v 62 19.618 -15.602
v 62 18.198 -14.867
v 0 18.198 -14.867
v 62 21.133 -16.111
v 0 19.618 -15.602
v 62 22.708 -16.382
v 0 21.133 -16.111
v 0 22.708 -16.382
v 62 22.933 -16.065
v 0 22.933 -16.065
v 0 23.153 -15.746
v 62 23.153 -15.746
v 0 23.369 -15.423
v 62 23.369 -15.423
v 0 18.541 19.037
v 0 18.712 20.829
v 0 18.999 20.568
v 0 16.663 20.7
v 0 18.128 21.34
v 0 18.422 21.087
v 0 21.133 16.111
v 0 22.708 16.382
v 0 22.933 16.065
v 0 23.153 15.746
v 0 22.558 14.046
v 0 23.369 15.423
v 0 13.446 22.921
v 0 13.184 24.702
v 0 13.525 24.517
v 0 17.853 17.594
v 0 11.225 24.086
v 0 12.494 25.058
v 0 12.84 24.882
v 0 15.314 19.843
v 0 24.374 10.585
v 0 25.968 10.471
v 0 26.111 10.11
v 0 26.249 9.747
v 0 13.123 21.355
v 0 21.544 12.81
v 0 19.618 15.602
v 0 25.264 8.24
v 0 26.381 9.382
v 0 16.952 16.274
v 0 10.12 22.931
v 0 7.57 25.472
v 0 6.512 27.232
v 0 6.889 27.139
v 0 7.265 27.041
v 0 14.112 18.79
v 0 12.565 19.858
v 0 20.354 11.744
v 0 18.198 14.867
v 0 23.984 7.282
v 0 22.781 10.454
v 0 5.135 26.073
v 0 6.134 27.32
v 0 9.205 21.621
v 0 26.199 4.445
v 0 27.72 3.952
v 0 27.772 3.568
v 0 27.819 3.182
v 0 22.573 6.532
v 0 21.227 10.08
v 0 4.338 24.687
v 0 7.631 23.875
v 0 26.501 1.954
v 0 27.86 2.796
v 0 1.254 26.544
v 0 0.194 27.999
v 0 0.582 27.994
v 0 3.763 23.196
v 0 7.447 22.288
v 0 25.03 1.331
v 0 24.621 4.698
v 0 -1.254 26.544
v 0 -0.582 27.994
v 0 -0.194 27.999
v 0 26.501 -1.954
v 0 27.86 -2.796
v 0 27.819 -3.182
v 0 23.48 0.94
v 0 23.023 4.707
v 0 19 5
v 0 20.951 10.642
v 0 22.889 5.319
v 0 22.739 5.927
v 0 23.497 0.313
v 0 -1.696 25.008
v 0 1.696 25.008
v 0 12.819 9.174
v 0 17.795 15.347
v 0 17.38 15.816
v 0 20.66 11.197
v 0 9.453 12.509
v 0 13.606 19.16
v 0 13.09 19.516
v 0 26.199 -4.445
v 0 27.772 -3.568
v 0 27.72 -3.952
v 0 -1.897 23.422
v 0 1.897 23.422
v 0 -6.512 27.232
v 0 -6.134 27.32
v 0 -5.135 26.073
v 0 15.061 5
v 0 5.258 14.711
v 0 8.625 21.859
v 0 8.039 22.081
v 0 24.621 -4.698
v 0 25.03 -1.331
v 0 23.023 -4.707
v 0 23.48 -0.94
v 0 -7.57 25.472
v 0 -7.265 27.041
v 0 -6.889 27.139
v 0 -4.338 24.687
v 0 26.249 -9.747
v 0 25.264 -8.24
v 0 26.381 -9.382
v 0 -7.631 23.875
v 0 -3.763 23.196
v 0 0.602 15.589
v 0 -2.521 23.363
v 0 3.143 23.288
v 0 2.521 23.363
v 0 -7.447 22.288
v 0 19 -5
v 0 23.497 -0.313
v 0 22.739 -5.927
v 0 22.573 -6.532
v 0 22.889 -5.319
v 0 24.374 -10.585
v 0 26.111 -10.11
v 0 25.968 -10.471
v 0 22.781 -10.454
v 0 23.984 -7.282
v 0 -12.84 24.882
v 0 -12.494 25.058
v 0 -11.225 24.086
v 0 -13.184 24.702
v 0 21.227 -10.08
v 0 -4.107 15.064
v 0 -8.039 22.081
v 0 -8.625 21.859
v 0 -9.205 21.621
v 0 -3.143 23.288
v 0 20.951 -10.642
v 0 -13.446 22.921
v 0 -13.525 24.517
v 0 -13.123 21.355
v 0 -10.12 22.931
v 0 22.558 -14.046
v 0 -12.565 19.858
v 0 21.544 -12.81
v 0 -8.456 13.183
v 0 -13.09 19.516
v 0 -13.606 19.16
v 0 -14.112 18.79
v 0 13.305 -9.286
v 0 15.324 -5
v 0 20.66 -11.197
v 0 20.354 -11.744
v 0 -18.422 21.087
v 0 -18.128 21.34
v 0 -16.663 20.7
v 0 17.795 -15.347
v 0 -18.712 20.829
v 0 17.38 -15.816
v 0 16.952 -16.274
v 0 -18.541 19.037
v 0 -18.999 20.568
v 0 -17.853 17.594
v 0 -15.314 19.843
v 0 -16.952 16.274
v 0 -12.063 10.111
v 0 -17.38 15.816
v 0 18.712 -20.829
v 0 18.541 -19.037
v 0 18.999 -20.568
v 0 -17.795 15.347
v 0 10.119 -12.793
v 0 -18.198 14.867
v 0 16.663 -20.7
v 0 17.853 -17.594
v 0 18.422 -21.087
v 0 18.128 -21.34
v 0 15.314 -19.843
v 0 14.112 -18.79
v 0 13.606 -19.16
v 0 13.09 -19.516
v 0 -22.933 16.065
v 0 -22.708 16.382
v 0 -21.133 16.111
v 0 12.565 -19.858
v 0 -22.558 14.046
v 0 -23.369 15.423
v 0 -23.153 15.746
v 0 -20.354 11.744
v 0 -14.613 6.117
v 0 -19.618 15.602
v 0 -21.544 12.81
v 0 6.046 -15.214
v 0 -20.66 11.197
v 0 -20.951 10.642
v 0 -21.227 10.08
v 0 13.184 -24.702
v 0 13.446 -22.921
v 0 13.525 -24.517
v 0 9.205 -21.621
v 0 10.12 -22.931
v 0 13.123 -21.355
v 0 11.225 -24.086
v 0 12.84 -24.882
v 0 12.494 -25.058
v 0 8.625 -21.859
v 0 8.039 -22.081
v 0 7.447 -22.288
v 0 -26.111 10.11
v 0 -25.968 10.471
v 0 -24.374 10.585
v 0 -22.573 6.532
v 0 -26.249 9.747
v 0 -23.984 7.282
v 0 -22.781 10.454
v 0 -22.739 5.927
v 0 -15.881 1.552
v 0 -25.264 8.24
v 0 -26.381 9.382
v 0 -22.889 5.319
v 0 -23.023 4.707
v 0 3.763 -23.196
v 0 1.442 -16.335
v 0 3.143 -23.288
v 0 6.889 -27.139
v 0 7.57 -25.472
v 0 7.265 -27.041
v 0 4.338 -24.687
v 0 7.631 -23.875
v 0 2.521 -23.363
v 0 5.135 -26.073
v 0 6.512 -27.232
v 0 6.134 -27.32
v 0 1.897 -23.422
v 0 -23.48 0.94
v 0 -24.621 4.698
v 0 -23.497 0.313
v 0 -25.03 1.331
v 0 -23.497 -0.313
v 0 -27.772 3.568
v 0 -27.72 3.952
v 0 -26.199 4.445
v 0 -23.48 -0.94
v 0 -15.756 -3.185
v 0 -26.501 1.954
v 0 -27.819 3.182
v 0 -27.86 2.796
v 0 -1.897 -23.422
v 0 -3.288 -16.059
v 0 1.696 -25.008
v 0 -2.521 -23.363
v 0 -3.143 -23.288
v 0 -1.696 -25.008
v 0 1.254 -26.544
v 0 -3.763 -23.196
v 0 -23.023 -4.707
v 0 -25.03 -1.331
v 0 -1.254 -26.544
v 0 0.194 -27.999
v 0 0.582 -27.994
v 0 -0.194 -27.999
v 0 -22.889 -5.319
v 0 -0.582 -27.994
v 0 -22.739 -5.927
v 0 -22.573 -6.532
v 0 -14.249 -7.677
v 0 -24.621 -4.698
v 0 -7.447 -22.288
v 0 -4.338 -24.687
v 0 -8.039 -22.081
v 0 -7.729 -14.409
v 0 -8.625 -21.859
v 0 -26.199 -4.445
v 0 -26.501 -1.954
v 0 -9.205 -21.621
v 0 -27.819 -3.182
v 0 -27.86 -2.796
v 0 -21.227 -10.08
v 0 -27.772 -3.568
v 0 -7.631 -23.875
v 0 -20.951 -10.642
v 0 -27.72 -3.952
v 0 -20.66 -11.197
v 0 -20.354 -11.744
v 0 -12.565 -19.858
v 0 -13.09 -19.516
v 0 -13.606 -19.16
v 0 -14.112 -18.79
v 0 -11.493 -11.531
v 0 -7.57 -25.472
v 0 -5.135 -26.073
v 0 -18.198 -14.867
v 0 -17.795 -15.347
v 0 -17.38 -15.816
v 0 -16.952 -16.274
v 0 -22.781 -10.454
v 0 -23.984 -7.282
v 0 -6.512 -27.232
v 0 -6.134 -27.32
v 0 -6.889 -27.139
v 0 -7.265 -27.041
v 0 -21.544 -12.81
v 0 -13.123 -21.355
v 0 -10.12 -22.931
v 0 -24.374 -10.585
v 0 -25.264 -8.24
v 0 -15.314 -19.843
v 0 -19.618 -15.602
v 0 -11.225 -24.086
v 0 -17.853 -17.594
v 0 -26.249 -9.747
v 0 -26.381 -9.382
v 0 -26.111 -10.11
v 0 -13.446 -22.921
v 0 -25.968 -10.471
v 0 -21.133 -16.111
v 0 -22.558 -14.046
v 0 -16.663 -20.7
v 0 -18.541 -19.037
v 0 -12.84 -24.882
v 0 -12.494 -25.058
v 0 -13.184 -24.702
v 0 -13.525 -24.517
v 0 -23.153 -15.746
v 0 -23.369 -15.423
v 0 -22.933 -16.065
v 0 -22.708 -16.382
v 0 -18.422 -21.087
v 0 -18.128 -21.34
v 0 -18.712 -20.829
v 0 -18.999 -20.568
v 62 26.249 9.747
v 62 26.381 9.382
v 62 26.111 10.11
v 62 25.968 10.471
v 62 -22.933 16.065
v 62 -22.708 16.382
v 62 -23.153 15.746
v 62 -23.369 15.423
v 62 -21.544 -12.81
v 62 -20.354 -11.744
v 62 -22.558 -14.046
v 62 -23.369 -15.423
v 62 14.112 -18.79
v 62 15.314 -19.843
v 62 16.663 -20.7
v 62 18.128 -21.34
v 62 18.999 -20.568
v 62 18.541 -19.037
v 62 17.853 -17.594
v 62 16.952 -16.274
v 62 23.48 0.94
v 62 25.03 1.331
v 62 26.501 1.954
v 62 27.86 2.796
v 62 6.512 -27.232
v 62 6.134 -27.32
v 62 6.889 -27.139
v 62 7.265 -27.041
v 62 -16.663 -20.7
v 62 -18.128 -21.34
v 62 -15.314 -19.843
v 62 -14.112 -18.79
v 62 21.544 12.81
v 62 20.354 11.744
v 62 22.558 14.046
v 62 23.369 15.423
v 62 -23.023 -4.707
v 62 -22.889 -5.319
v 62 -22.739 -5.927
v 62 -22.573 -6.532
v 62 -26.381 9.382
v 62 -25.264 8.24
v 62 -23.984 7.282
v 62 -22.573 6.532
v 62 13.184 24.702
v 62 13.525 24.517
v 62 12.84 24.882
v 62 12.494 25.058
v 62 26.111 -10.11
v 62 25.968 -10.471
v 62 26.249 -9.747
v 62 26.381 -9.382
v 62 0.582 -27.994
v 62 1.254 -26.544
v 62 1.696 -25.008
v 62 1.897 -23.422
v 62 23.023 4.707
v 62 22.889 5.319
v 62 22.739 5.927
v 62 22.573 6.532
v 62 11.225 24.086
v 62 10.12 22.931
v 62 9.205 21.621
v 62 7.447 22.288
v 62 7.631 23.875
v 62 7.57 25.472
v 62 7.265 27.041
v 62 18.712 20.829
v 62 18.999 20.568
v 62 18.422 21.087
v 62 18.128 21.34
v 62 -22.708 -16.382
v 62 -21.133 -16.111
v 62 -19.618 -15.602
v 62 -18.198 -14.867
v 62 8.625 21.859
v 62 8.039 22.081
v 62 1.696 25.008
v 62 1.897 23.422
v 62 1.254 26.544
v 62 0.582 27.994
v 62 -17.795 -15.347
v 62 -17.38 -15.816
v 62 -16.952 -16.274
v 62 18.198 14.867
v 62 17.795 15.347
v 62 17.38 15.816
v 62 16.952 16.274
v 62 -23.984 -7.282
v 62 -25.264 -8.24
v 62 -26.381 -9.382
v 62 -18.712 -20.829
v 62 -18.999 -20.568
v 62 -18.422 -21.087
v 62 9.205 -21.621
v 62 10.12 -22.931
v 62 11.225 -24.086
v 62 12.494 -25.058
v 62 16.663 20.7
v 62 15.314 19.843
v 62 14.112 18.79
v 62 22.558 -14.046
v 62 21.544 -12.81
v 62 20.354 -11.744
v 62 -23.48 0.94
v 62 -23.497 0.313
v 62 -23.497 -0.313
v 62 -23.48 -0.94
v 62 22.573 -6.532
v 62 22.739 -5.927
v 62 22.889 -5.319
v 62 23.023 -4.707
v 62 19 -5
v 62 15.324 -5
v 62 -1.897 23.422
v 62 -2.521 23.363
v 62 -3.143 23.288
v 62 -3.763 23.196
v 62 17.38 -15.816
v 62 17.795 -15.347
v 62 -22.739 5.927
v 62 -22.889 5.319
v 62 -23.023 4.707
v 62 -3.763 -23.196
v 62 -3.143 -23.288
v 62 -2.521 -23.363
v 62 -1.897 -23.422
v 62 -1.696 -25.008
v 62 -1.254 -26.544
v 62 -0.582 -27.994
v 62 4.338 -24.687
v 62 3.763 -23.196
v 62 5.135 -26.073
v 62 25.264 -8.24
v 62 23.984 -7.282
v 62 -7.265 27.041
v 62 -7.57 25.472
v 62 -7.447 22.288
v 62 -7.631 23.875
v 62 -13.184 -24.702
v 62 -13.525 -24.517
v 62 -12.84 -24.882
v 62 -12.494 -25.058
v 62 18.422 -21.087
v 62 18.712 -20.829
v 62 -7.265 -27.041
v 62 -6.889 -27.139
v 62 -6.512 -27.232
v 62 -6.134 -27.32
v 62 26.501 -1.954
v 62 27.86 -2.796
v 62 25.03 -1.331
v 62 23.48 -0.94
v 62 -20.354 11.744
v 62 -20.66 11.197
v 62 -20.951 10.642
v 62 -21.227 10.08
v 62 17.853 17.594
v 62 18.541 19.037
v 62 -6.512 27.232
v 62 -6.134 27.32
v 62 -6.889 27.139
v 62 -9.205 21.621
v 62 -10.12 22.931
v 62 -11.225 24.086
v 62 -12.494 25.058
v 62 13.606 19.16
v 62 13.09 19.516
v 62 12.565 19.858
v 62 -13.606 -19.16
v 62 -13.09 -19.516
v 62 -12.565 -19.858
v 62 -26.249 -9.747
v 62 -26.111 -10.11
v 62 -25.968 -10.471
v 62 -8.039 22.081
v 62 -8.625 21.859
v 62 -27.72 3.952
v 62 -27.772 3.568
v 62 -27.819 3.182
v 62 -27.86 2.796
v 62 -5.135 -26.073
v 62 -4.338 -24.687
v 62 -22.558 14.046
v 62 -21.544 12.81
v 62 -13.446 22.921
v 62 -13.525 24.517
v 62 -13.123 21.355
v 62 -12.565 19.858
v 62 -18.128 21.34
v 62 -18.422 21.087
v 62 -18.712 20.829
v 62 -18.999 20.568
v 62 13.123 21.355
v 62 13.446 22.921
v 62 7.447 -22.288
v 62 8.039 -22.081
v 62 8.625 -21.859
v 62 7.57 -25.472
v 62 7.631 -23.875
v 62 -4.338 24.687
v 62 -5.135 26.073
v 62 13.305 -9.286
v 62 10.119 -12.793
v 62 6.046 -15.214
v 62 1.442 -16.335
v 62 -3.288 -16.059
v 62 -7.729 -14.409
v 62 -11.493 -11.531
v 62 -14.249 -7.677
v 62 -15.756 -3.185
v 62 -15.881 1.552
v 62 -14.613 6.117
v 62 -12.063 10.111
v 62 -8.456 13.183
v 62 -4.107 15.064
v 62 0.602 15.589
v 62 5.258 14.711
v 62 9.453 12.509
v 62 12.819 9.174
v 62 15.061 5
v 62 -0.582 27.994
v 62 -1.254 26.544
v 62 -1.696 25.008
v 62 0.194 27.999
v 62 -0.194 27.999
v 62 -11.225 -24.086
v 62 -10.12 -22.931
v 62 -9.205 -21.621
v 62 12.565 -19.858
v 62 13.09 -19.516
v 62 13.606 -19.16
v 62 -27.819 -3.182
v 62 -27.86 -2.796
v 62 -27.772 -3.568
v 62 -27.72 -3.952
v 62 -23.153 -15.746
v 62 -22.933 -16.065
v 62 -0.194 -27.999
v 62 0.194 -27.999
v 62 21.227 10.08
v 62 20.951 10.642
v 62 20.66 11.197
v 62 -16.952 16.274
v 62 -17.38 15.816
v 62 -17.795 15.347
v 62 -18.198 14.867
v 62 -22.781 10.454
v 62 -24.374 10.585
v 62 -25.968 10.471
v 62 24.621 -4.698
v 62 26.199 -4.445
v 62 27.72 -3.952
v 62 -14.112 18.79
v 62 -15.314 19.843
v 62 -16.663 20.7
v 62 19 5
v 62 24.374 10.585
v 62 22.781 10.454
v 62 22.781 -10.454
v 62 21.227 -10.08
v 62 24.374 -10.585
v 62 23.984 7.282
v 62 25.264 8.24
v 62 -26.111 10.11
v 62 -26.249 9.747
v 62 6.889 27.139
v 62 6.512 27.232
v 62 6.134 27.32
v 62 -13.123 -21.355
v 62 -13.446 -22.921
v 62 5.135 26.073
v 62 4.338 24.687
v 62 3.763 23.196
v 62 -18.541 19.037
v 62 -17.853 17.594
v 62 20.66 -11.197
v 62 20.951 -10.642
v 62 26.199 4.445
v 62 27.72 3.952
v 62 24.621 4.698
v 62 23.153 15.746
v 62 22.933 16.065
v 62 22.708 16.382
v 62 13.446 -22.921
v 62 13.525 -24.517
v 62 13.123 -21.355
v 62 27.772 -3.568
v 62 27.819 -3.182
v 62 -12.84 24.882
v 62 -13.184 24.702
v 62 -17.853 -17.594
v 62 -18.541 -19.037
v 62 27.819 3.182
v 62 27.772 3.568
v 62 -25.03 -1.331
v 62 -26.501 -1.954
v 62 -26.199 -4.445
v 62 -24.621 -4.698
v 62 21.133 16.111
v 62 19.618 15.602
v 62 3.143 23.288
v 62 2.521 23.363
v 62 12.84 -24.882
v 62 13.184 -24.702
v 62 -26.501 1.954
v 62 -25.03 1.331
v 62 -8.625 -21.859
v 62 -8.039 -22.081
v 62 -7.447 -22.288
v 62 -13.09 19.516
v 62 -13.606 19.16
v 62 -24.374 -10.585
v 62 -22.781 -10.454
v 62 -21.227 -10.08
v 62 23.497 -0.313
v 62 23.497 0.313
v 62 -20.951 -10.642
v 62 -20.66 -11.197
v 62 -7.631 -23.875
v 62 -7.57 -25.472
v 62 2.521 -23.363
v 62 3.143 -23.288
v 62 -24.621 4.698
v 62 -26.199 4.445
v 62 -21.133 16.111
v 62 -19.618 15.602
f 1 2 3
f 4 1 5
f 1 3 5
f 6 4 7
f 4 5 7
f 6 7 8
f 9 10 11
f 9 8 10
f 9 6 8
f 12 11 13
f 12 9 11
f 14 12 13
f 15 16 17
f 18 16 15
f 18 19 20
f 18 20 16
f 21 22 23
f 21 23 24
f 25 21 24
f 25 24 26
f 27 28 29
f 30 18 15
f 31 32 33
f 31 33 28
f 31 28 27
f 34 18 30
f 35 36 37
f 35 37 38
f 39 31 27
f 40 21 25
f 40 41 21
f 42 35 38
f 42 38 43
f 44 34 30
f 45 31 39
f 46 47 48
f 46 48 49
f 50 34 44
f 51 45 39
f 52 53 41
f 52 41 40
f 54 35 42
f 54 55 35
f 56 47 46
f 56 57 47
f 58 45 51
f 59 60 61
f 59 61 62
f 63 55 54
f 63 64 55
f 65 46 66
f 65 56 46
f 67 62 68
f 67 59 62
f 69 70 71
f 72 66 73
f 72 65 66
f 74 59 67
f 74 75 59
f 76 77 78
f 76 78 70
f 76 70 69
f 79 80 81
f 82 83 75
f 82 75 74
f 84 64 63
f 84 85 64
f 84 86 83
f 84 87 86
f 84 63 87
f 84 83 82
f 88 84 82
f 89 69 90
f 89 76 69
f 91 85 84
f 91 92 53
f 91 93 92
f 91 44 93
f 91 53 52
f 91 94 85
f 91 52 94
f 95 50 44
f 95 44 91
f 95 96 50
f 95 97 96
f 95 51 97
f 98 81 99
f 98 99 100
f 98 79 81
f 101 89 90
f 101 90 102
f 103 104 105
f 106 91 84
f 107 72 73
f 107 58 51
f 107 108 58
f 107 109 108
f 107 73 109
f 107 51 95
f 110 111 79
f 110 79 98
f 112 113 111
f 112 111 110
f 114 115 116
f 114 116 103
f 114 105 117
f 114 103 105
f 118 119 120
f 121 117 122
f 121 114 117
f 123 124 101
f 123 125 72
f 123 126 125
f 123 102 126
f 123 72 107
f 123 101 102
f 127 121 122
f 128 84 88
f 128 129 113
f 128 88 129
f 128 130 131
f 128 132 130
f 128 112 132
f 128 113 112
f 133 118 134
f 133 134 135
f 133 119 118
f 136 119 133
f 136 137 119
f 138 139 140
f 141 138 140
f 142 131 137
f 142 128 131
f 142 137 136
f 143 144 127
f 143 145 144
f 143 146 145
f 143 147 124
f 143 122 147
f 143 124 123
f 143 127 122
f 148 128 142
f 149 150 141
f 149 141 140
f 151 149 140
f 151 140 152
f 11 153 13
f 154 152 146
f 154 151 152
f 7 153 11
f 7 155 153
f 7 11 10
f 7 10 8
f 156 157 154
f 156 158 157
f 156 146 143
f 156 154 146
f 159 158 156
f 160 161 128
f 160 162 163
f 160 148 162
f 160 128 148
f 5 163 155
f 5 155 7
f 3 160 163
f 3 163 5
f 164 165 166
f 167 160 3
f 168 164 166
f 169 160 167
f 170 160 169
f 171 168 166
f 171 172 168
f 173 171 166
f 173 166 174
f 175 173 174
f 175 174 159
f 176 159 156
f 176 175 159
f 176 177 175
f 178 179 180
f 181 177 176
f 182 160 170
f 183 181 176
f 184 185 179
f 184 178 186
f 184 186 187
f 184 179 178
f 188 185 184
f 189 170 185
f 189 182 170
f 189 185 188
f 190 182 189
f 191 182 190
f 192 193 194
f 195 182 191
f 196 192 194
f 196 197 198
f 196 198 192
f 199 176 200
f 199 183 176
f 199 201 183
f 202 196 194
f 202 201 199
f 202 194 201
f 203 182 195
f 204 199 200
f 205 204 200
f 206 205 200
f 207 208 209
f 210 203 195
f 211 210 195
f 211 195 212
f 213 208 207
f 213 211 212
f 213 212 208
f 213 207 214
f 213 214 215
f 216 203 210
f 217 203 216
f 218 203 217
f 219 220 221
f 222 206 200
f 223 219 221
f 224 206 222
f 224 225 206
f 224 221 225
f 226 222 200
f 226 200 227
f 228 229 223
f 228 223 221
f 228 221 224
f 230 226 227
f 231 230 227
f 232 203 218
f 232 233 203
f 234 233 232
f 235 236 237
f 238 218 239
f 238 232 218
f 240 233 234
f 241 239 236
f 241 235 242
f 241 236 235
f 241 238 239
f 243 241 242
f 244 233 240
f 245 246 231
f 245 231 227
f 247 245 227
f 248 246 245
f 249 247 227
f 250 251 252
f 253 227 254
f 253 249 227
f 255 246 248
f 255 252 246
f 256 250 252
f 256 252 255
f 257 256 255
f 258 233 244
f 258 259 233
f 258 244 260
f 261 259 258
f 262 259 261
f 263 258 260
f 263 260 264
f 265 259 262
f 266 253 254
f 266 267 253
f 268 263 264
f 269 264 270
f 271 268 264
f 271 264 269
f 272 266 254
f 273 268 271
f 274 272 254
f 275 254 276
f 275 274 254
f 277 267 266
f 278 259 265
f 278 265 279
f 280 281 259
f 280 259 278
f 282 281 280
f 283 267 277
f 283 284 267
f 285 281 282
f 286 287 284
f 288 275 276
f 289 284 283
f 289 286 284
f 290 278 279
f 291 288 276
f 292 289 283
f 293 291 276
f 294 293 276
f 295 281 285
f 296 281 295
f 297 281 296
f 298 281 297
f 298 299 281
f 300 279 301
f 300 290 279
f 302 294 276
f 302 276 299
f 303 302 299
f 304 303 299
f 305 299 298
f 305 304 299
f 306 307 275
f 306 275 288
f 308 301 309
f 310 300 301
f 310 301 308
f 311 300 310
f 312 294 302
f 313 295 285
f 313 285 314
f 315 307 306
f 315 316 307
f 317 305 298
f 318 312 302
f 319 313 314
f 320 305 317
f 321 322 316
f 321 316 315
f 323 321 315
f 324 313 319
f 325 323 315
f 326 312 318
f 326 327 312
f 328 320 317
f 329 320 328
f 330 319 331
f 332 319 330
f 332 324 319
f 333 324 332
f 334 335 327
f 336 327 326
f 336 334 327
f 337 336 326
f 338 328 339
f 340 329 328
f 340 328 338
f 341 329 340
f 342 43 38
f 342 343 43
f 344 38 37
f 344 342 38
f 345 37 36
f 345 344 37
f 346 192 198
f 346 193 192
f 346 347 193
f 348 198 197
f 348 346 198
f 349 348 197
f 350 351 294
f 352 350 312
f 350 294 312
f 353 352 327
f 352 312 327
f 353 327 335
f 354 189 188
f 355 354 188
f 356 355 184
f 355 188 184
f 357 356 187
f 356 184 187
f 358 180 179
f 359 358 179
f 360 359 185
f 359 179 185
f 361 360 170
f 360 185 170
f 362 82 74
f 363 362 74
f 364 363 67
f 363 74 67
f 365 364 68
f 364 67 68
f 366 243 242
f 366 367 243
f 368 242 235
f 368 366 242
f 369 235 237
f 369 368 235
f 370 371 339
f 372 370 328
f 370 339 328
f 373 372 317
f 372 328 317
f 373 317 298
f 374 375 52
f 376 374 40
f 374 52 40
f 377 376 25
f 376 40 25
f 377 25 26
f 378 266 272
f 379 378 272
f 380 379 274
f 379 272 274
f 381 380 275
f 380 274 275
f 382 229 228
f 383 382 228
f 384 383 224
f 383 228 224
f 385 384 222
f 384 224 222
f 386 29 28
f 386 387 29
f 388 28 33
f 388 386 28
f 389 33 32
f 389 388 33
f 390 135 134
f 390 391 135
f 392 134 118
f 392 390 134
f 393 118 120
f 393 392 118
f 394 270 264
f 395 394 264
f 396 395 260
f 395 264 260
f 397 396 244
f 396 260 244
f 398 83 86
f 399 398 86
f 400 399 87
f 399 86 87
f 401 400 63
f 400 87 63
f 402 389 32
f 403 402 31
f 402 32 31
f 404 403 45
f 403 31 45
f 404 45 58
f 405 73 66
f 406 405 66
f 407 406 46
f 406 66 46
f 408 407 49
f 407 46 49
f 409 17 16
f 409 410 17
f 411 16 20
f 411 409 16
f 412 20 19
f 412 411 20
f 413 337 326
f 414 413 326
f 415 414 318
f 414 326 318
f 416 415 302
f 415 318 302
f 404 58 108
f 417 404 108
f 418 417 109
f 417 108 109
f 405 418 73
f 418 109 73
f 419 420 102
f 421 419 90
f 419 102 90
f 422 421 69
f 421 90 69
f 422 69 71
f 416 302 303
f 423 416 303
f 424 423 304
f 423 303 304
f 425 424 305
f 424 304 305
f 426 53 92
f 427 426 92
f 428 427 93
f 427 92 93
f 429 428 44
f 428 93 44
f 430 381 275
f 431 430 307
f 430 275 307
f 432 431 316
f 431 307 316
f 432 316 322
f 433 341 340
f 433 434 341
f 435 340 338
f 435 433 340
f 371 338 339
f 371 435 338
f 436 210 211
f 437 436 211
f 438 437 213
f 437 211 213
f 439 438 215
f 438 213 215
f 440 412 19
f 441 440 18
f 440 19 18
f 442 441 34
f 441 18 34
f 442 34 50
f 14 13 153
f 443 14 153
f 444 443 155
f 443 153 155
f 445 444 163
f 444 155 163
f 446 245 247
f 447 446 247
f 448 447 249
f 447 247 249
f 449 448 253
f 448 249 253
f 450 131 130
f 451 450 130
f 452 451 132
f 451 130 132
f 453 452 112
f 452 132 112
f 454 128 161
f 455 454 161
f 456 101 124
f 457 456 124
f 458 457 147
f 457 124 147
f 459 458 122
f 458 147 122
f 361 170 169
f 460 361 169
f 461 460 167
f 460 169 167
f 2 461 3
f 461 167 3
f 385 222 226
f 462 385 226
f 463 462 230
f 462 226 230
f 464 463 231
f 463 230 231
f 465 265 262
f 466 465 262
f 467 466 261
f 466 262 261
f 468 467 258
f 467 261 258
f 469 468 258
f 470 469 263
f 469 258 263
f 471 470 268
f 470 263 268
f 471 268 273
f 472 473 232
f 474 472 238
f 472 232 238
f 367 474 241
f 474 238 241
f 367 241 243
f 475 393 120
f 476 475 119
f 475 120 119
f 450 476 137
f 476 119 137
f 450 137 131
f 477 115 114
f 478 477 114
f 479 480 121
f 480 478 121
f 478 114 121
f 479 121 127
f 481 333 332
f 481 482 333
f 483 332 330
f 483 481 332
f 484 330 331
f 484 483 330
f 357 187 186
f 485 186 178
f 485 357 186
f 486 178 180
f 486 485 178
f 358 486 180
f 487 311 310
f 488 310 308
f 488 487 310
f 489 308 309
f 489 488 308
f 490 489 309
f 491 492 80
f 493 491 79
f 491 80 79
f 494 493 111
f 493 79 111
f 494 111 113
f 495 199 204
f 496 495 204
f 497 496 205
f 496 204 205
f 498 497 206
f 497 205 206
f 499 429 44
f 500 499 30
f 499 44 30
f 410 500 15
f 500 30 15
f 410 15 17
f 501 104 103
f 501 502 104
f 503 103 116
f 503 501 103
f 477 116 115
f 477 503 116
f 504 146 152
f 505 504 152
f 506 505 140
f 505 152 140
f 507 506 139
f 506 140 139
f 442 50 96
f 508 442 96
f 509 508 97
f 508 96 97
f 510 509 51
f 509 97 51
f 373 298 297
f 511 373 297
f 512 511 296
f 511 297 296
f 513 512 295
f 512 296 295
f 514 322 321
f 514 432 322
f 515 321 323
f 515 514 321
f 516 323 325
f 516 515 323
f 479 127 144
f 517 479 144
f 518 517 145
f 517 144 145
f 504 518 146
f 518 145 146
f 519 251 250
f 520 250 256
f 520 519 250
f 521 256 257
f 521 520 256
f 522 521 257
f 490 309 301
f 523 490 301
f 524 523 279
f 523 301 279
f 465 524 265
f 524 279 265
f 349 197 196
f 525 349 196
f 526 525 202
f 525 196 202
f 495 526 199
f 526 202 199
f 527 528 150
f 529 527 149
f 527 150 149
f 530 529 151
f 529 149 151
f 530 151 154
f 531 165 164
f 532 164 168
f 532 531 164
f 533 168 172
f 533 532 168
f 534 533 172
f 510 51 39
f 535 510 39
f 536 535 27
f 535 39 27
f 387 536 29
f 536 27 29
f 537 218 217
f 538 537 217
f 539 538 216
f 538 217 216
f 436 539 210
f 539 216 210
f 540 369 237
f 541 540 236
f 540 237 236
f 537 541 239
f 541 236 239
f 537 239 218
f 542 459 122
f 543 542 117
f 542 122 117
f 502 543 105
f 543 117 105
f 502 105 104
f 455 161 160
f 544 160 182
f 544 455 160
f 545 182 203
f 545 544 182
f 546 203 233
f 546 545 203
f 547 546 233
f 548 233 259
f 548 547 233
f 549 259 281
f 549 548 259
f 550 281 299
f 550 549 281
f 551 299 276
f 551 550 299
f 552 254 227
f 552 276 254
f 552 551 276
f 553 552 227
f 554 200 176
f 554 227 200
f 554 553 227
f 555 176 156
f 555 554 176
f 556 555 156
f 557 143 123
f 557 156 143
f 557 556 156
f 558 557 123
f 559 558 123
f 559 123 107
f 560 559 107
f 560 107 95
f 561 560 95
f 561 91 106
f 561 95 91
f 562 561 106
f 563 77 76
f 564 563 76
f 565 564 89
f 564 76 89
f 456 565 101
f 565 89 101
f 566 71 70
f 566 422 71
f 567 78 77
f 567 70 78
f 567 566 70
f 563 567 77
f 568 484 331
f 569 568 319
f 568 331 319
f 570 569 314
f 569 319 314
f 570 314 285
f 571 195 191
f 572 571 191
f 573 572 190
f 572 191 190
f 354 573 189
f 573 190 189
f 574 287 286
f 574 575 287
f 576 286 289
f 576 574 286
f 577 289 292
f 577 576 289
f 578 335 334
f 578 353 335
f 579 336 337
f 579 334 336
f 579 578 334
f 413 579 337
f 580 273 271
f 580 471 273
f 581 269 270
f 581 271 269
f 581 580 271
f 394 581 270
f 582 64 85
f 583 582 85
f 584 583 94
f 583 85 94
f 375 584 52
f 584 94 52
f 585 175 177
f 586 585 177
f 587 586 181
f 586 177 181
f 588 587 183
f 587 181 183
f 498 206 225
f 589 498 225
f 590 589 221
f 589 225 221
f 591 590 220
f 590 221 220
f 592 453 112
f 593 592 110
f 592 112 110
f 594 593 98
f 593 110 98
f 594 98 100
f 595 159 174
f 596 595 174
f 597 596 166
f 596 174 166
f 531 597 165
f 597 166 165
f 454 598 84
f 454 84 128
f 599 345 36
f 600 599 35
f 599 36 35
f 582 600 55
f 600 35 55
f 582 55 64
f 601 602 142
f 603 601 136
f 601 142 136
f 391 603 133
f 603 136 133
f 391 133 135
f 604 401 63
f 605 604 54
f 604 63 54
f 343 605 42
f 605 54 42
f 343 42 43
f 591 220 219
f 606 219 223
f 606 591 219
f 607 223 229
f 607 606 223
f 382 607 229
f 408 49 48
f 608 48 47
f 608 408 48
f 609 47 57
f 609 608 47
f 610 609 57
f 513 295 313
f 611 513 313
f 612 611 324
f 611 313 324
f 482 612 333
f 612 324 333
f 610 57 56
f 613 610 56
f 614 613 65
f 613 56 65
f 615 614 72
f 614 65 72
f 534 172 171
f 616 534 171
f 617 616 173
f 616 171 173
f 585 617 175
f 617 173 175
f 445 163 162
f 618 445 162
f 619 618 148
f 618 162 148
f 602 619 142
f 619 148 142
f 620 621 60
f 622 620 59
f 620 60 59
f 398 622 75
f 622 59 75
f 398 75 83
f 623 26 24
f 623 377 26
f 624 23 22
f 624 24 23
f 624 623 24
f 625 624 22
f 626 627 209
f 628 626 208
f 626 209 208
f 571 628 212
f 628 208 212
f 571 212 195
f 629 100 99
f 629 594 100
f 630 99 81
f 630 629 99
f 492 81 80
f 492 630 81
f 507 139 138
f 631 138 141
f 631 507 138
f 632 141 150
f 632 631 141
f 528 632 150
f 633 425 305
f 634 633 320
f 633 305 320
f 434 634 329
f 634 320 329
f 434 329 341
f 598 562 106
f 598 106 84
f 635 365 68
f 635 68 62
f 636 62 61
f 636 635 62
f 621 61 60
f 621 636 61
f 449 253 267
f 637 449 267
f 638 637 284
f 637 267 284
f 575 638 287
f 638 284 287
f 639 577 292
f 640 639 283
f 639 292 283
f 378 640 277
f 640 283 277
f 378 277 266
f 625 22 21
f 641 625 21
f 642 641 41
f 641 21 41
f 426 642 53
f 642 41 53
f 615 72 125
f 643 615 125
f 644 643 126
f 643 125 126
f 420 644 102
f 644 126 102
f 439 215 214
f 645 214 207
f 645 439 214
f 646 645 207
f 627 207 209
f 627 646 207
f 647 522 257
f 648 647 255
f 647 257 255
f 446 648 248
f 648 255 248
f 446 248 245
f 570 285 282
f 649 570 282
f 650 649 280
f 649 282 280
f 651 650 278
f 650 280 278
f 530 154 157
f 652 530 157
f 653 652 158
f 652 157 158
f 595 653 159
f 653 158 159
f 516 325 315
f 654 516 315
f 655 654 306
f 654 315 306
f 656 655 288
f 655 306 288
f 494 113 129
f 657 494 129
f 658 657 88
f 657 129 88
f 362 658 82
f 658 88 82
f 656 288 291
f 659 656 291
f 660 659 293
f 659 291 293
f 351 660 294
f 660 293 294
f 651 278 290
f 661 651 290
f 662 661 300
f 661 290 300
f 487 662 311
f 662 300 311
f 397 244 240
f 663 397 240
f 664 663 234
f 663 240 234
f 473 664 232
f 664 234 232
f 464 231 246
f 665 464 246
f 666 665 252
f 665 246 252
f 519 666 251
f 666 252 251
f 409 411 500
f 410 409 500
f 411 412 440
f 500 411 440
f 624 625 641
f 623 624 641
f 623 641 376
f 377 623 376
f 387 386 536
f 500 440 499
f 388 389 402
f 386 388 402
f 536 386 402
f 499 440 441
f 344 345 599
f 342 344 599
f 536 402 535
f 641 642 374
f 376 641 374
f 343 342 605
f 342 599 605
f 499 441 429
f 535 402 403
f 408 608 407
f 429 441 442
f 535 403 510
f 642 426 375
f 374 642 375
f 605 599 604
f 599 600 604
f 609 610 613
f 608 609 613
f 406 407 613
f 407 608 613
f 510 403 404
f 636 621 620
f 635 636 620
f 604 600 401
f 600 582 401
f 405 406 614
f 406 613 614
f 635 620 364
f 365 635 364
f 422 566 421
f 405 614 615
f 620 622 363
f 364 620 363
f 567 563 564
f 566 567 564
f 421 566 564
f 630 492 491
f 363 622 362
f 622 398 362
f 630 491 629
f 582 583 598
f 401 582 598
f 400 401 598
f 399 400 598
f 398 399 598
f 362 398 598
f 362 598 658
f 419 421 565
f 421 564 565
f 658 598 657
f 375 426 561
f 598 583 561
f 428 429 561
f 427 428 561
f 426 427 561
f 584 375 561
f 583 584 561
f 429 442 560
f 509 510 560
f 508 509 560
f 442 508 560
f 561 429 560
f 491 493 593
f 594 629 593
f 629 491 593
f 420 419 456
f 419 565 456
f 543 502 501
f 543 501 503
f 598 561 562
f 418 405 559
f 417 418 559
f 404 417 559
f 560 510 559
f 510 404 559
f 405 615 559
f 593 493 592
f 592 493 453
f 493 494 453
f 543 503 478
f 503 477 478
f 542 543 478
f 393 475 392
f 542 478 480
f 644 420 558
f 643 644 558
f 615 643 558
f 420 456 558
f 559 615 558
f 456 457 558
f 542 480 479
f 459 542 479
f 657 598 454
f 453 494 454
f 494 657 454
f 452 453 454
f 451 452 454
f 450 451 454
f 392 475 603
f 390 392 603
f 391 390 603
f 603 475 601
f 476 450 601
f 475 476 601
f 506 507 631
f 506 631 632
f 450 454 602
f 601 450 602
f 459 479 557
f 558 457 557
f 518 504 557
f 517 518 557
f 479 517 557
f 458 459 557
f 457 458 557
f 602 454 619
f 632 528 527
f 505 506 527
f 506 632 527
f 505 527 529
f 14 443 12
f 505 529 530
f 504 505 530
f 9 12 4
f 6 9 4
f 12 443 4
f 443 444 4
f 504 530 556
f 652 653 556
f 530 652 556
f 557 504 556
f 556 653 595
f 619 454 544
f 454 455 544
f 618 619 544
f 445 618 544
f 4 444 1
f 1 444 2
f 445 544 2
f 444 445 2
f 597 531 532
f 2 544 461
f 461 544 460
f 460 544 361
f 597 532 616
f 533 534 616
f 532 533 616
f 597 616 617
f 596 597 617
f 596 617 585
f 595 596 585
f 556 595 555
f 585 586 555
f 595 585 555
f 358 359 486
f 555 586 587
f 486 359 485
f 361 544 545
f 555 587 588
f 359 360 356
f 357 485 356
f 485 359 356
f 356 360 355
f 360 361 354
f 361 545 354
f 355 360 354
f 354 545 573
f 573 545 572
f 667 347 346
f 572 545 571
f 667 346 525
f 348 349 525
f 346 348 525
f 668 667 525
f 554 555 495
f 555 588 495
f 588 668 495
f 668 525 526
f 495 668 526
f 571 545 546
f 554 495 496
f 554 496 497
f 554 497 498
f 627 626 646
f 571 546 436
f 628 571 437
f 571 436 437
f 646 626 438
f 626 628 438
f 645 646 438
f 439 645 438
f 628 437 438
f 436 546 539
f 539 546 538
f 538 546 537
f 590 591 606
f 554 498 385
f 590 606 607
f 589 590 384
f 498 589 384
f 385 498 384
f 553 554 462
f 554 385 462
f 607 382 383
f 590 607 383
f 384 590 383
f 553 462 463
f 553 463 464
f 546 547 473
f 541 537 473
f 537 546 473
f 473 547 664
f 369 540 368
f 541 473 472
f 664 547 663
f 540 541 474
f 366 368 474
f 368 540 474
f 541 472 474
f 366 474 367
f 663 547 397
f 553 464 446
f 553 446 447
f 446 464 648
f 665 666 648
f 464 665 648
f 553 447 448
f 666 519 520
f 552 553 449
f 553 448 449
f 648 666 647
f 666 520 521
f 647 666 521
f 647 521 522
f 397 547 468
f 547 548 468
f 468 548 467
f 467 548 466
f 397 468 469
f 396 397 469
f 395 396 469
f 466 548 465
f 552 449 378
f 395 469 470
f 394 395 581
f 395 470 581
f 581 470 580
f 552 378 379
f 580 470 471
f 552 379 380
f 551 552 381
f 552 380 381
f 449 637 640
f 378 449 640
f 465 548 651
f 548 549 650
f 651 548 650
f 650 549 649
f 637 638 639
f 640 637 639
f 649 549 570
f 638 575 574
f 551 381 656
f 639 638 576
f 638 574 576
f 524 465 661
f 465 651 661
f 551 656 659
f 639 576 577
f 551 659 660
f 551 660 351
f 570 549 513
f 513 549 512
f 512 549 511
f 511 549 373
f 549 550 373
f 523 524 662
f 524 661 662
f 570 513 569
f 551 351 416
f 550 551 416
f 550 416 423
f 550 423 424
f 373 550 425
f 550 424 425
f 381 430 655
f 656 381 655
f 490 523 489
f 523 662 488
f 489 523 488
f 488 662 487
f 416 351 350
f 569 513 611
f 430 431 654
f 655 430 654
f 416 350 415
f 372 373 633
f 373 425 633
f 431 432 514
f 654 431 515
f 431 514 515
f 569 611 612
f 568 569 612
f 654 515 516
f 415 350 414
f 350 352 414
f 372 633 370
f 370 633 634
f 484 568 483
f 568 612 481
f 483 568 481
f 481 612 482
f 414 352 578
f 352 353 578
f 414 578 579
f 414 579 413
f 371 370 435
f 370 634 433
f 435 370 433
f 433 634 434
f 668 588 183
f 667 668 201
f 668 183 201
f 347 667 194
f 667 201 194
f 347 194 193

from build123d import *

# Parameters (mm, degrees)
BASPROSKE_W        = 62
BASPROSKE_H        = 28
TOOTHCUT_DEPTH     = 74.566296631
TEETHCUTS_COUNT    = 26
TEETHCUTS_ANGLE    = 346.153846154
BORSKE_R           = 0.4
BORE_DEPTH         = 62.0000508
CUT_EXTRUDE1_DEPTH = 74.51313205


with BuildPart() as part:
    # BasProSke → Base-Revolve (revolve)
    with BuildSketch(Plane(origin=(0, 0, 0), x_dir=(1, 0, 0), z_dir=(0, 1, 0)), mode=Mode.PRIVATE) as base_revolve_sk:
        with Locations((31, 14)):
            Rectangle(BASPROSKE_W, BASPROSKE_H)
    revolve(base_revolve_sk.sketch.rotate(Axis((-10, 0, 0), (1, 0, 0)), 180), axis=Axis((-10, 0, 0), (1, 0, 0)))

    # TooCutSke → ToothCut (cut, through all)
    with BuildSketch(Plane(origin=(0, 0, 0), x_dir=(0, 0, -1), z_dir=(1, 0, 0))):
        with BuildLine():
            ThreePointArc((0.939856059, 23.480197435), (0, 23.499), (-0.939856059, 23.480197435))
            ThreePointArc((-0.939856059, 23.480197435), (-1.620069556, 25.791248201), (-2.813767052, 27.883790276))
            ThreePointArc((-2.813767052, 27.883790276), (0, 28.0254), (2.813767052, 27.883790276))
            ThreePointArc((2.813767052, 27.883790276), (1.620069556, 25.791248201), (0.939856059, 23.480197435))
        make_face()
    toothcut = extrude(amount=TOOTHCUT_DEPTH, mode=Mode.SUBTRACT)

    # TeethCuts: ToothCut ×26 about axis
    teethcuts_axis = Axis((-10, 0, 0), (1, 0, 0))
    for i in range(1, TEETHCUTS_COUNT):
        add(toothcut.rotate(teethcuts_axis, i * TEETHCUTS_ANGLE / (TEETHCUTS_COUNT - 1)), mode=Mode.SUBTRACT)

    # BorSke → Bore (cut, symmetric)
    with BuildSketch(Plane(origin=(0, 0, 0), x_dir=(0, 0, -1), z_dir=(1, 0, 0))):
        with Locations(Location((0, 0, 0), (0, 0, 180))):
            Circle(BORSKE_R)
    extrude(amount=BORE_DEPTH, both=True, mode=Mode.SUBTRACT)

    # Sketch1 → Cut-Extrude1 (cut, through all)
    with BuildSketch(Plane(origin=(62, 0, 0), x_dir=(0, 0, -1), z_dir=(1, 0, 0))):
        with BuildLine():
            Line((-5, 19), (5, 19))
            Line((5, 19), (5, 15.324490204))
            ThreePointArc((5, 15.324490204), (0.82110488, -15.994457499), (-5, 15.061208451))
            Line((-5, 15.061208451), (-5, 19))
        make_face()
    extrude(amount=-CUT_EXTRUDE1_DEPTH, mode=Mode.SUBTRACT)


solid = part.part
